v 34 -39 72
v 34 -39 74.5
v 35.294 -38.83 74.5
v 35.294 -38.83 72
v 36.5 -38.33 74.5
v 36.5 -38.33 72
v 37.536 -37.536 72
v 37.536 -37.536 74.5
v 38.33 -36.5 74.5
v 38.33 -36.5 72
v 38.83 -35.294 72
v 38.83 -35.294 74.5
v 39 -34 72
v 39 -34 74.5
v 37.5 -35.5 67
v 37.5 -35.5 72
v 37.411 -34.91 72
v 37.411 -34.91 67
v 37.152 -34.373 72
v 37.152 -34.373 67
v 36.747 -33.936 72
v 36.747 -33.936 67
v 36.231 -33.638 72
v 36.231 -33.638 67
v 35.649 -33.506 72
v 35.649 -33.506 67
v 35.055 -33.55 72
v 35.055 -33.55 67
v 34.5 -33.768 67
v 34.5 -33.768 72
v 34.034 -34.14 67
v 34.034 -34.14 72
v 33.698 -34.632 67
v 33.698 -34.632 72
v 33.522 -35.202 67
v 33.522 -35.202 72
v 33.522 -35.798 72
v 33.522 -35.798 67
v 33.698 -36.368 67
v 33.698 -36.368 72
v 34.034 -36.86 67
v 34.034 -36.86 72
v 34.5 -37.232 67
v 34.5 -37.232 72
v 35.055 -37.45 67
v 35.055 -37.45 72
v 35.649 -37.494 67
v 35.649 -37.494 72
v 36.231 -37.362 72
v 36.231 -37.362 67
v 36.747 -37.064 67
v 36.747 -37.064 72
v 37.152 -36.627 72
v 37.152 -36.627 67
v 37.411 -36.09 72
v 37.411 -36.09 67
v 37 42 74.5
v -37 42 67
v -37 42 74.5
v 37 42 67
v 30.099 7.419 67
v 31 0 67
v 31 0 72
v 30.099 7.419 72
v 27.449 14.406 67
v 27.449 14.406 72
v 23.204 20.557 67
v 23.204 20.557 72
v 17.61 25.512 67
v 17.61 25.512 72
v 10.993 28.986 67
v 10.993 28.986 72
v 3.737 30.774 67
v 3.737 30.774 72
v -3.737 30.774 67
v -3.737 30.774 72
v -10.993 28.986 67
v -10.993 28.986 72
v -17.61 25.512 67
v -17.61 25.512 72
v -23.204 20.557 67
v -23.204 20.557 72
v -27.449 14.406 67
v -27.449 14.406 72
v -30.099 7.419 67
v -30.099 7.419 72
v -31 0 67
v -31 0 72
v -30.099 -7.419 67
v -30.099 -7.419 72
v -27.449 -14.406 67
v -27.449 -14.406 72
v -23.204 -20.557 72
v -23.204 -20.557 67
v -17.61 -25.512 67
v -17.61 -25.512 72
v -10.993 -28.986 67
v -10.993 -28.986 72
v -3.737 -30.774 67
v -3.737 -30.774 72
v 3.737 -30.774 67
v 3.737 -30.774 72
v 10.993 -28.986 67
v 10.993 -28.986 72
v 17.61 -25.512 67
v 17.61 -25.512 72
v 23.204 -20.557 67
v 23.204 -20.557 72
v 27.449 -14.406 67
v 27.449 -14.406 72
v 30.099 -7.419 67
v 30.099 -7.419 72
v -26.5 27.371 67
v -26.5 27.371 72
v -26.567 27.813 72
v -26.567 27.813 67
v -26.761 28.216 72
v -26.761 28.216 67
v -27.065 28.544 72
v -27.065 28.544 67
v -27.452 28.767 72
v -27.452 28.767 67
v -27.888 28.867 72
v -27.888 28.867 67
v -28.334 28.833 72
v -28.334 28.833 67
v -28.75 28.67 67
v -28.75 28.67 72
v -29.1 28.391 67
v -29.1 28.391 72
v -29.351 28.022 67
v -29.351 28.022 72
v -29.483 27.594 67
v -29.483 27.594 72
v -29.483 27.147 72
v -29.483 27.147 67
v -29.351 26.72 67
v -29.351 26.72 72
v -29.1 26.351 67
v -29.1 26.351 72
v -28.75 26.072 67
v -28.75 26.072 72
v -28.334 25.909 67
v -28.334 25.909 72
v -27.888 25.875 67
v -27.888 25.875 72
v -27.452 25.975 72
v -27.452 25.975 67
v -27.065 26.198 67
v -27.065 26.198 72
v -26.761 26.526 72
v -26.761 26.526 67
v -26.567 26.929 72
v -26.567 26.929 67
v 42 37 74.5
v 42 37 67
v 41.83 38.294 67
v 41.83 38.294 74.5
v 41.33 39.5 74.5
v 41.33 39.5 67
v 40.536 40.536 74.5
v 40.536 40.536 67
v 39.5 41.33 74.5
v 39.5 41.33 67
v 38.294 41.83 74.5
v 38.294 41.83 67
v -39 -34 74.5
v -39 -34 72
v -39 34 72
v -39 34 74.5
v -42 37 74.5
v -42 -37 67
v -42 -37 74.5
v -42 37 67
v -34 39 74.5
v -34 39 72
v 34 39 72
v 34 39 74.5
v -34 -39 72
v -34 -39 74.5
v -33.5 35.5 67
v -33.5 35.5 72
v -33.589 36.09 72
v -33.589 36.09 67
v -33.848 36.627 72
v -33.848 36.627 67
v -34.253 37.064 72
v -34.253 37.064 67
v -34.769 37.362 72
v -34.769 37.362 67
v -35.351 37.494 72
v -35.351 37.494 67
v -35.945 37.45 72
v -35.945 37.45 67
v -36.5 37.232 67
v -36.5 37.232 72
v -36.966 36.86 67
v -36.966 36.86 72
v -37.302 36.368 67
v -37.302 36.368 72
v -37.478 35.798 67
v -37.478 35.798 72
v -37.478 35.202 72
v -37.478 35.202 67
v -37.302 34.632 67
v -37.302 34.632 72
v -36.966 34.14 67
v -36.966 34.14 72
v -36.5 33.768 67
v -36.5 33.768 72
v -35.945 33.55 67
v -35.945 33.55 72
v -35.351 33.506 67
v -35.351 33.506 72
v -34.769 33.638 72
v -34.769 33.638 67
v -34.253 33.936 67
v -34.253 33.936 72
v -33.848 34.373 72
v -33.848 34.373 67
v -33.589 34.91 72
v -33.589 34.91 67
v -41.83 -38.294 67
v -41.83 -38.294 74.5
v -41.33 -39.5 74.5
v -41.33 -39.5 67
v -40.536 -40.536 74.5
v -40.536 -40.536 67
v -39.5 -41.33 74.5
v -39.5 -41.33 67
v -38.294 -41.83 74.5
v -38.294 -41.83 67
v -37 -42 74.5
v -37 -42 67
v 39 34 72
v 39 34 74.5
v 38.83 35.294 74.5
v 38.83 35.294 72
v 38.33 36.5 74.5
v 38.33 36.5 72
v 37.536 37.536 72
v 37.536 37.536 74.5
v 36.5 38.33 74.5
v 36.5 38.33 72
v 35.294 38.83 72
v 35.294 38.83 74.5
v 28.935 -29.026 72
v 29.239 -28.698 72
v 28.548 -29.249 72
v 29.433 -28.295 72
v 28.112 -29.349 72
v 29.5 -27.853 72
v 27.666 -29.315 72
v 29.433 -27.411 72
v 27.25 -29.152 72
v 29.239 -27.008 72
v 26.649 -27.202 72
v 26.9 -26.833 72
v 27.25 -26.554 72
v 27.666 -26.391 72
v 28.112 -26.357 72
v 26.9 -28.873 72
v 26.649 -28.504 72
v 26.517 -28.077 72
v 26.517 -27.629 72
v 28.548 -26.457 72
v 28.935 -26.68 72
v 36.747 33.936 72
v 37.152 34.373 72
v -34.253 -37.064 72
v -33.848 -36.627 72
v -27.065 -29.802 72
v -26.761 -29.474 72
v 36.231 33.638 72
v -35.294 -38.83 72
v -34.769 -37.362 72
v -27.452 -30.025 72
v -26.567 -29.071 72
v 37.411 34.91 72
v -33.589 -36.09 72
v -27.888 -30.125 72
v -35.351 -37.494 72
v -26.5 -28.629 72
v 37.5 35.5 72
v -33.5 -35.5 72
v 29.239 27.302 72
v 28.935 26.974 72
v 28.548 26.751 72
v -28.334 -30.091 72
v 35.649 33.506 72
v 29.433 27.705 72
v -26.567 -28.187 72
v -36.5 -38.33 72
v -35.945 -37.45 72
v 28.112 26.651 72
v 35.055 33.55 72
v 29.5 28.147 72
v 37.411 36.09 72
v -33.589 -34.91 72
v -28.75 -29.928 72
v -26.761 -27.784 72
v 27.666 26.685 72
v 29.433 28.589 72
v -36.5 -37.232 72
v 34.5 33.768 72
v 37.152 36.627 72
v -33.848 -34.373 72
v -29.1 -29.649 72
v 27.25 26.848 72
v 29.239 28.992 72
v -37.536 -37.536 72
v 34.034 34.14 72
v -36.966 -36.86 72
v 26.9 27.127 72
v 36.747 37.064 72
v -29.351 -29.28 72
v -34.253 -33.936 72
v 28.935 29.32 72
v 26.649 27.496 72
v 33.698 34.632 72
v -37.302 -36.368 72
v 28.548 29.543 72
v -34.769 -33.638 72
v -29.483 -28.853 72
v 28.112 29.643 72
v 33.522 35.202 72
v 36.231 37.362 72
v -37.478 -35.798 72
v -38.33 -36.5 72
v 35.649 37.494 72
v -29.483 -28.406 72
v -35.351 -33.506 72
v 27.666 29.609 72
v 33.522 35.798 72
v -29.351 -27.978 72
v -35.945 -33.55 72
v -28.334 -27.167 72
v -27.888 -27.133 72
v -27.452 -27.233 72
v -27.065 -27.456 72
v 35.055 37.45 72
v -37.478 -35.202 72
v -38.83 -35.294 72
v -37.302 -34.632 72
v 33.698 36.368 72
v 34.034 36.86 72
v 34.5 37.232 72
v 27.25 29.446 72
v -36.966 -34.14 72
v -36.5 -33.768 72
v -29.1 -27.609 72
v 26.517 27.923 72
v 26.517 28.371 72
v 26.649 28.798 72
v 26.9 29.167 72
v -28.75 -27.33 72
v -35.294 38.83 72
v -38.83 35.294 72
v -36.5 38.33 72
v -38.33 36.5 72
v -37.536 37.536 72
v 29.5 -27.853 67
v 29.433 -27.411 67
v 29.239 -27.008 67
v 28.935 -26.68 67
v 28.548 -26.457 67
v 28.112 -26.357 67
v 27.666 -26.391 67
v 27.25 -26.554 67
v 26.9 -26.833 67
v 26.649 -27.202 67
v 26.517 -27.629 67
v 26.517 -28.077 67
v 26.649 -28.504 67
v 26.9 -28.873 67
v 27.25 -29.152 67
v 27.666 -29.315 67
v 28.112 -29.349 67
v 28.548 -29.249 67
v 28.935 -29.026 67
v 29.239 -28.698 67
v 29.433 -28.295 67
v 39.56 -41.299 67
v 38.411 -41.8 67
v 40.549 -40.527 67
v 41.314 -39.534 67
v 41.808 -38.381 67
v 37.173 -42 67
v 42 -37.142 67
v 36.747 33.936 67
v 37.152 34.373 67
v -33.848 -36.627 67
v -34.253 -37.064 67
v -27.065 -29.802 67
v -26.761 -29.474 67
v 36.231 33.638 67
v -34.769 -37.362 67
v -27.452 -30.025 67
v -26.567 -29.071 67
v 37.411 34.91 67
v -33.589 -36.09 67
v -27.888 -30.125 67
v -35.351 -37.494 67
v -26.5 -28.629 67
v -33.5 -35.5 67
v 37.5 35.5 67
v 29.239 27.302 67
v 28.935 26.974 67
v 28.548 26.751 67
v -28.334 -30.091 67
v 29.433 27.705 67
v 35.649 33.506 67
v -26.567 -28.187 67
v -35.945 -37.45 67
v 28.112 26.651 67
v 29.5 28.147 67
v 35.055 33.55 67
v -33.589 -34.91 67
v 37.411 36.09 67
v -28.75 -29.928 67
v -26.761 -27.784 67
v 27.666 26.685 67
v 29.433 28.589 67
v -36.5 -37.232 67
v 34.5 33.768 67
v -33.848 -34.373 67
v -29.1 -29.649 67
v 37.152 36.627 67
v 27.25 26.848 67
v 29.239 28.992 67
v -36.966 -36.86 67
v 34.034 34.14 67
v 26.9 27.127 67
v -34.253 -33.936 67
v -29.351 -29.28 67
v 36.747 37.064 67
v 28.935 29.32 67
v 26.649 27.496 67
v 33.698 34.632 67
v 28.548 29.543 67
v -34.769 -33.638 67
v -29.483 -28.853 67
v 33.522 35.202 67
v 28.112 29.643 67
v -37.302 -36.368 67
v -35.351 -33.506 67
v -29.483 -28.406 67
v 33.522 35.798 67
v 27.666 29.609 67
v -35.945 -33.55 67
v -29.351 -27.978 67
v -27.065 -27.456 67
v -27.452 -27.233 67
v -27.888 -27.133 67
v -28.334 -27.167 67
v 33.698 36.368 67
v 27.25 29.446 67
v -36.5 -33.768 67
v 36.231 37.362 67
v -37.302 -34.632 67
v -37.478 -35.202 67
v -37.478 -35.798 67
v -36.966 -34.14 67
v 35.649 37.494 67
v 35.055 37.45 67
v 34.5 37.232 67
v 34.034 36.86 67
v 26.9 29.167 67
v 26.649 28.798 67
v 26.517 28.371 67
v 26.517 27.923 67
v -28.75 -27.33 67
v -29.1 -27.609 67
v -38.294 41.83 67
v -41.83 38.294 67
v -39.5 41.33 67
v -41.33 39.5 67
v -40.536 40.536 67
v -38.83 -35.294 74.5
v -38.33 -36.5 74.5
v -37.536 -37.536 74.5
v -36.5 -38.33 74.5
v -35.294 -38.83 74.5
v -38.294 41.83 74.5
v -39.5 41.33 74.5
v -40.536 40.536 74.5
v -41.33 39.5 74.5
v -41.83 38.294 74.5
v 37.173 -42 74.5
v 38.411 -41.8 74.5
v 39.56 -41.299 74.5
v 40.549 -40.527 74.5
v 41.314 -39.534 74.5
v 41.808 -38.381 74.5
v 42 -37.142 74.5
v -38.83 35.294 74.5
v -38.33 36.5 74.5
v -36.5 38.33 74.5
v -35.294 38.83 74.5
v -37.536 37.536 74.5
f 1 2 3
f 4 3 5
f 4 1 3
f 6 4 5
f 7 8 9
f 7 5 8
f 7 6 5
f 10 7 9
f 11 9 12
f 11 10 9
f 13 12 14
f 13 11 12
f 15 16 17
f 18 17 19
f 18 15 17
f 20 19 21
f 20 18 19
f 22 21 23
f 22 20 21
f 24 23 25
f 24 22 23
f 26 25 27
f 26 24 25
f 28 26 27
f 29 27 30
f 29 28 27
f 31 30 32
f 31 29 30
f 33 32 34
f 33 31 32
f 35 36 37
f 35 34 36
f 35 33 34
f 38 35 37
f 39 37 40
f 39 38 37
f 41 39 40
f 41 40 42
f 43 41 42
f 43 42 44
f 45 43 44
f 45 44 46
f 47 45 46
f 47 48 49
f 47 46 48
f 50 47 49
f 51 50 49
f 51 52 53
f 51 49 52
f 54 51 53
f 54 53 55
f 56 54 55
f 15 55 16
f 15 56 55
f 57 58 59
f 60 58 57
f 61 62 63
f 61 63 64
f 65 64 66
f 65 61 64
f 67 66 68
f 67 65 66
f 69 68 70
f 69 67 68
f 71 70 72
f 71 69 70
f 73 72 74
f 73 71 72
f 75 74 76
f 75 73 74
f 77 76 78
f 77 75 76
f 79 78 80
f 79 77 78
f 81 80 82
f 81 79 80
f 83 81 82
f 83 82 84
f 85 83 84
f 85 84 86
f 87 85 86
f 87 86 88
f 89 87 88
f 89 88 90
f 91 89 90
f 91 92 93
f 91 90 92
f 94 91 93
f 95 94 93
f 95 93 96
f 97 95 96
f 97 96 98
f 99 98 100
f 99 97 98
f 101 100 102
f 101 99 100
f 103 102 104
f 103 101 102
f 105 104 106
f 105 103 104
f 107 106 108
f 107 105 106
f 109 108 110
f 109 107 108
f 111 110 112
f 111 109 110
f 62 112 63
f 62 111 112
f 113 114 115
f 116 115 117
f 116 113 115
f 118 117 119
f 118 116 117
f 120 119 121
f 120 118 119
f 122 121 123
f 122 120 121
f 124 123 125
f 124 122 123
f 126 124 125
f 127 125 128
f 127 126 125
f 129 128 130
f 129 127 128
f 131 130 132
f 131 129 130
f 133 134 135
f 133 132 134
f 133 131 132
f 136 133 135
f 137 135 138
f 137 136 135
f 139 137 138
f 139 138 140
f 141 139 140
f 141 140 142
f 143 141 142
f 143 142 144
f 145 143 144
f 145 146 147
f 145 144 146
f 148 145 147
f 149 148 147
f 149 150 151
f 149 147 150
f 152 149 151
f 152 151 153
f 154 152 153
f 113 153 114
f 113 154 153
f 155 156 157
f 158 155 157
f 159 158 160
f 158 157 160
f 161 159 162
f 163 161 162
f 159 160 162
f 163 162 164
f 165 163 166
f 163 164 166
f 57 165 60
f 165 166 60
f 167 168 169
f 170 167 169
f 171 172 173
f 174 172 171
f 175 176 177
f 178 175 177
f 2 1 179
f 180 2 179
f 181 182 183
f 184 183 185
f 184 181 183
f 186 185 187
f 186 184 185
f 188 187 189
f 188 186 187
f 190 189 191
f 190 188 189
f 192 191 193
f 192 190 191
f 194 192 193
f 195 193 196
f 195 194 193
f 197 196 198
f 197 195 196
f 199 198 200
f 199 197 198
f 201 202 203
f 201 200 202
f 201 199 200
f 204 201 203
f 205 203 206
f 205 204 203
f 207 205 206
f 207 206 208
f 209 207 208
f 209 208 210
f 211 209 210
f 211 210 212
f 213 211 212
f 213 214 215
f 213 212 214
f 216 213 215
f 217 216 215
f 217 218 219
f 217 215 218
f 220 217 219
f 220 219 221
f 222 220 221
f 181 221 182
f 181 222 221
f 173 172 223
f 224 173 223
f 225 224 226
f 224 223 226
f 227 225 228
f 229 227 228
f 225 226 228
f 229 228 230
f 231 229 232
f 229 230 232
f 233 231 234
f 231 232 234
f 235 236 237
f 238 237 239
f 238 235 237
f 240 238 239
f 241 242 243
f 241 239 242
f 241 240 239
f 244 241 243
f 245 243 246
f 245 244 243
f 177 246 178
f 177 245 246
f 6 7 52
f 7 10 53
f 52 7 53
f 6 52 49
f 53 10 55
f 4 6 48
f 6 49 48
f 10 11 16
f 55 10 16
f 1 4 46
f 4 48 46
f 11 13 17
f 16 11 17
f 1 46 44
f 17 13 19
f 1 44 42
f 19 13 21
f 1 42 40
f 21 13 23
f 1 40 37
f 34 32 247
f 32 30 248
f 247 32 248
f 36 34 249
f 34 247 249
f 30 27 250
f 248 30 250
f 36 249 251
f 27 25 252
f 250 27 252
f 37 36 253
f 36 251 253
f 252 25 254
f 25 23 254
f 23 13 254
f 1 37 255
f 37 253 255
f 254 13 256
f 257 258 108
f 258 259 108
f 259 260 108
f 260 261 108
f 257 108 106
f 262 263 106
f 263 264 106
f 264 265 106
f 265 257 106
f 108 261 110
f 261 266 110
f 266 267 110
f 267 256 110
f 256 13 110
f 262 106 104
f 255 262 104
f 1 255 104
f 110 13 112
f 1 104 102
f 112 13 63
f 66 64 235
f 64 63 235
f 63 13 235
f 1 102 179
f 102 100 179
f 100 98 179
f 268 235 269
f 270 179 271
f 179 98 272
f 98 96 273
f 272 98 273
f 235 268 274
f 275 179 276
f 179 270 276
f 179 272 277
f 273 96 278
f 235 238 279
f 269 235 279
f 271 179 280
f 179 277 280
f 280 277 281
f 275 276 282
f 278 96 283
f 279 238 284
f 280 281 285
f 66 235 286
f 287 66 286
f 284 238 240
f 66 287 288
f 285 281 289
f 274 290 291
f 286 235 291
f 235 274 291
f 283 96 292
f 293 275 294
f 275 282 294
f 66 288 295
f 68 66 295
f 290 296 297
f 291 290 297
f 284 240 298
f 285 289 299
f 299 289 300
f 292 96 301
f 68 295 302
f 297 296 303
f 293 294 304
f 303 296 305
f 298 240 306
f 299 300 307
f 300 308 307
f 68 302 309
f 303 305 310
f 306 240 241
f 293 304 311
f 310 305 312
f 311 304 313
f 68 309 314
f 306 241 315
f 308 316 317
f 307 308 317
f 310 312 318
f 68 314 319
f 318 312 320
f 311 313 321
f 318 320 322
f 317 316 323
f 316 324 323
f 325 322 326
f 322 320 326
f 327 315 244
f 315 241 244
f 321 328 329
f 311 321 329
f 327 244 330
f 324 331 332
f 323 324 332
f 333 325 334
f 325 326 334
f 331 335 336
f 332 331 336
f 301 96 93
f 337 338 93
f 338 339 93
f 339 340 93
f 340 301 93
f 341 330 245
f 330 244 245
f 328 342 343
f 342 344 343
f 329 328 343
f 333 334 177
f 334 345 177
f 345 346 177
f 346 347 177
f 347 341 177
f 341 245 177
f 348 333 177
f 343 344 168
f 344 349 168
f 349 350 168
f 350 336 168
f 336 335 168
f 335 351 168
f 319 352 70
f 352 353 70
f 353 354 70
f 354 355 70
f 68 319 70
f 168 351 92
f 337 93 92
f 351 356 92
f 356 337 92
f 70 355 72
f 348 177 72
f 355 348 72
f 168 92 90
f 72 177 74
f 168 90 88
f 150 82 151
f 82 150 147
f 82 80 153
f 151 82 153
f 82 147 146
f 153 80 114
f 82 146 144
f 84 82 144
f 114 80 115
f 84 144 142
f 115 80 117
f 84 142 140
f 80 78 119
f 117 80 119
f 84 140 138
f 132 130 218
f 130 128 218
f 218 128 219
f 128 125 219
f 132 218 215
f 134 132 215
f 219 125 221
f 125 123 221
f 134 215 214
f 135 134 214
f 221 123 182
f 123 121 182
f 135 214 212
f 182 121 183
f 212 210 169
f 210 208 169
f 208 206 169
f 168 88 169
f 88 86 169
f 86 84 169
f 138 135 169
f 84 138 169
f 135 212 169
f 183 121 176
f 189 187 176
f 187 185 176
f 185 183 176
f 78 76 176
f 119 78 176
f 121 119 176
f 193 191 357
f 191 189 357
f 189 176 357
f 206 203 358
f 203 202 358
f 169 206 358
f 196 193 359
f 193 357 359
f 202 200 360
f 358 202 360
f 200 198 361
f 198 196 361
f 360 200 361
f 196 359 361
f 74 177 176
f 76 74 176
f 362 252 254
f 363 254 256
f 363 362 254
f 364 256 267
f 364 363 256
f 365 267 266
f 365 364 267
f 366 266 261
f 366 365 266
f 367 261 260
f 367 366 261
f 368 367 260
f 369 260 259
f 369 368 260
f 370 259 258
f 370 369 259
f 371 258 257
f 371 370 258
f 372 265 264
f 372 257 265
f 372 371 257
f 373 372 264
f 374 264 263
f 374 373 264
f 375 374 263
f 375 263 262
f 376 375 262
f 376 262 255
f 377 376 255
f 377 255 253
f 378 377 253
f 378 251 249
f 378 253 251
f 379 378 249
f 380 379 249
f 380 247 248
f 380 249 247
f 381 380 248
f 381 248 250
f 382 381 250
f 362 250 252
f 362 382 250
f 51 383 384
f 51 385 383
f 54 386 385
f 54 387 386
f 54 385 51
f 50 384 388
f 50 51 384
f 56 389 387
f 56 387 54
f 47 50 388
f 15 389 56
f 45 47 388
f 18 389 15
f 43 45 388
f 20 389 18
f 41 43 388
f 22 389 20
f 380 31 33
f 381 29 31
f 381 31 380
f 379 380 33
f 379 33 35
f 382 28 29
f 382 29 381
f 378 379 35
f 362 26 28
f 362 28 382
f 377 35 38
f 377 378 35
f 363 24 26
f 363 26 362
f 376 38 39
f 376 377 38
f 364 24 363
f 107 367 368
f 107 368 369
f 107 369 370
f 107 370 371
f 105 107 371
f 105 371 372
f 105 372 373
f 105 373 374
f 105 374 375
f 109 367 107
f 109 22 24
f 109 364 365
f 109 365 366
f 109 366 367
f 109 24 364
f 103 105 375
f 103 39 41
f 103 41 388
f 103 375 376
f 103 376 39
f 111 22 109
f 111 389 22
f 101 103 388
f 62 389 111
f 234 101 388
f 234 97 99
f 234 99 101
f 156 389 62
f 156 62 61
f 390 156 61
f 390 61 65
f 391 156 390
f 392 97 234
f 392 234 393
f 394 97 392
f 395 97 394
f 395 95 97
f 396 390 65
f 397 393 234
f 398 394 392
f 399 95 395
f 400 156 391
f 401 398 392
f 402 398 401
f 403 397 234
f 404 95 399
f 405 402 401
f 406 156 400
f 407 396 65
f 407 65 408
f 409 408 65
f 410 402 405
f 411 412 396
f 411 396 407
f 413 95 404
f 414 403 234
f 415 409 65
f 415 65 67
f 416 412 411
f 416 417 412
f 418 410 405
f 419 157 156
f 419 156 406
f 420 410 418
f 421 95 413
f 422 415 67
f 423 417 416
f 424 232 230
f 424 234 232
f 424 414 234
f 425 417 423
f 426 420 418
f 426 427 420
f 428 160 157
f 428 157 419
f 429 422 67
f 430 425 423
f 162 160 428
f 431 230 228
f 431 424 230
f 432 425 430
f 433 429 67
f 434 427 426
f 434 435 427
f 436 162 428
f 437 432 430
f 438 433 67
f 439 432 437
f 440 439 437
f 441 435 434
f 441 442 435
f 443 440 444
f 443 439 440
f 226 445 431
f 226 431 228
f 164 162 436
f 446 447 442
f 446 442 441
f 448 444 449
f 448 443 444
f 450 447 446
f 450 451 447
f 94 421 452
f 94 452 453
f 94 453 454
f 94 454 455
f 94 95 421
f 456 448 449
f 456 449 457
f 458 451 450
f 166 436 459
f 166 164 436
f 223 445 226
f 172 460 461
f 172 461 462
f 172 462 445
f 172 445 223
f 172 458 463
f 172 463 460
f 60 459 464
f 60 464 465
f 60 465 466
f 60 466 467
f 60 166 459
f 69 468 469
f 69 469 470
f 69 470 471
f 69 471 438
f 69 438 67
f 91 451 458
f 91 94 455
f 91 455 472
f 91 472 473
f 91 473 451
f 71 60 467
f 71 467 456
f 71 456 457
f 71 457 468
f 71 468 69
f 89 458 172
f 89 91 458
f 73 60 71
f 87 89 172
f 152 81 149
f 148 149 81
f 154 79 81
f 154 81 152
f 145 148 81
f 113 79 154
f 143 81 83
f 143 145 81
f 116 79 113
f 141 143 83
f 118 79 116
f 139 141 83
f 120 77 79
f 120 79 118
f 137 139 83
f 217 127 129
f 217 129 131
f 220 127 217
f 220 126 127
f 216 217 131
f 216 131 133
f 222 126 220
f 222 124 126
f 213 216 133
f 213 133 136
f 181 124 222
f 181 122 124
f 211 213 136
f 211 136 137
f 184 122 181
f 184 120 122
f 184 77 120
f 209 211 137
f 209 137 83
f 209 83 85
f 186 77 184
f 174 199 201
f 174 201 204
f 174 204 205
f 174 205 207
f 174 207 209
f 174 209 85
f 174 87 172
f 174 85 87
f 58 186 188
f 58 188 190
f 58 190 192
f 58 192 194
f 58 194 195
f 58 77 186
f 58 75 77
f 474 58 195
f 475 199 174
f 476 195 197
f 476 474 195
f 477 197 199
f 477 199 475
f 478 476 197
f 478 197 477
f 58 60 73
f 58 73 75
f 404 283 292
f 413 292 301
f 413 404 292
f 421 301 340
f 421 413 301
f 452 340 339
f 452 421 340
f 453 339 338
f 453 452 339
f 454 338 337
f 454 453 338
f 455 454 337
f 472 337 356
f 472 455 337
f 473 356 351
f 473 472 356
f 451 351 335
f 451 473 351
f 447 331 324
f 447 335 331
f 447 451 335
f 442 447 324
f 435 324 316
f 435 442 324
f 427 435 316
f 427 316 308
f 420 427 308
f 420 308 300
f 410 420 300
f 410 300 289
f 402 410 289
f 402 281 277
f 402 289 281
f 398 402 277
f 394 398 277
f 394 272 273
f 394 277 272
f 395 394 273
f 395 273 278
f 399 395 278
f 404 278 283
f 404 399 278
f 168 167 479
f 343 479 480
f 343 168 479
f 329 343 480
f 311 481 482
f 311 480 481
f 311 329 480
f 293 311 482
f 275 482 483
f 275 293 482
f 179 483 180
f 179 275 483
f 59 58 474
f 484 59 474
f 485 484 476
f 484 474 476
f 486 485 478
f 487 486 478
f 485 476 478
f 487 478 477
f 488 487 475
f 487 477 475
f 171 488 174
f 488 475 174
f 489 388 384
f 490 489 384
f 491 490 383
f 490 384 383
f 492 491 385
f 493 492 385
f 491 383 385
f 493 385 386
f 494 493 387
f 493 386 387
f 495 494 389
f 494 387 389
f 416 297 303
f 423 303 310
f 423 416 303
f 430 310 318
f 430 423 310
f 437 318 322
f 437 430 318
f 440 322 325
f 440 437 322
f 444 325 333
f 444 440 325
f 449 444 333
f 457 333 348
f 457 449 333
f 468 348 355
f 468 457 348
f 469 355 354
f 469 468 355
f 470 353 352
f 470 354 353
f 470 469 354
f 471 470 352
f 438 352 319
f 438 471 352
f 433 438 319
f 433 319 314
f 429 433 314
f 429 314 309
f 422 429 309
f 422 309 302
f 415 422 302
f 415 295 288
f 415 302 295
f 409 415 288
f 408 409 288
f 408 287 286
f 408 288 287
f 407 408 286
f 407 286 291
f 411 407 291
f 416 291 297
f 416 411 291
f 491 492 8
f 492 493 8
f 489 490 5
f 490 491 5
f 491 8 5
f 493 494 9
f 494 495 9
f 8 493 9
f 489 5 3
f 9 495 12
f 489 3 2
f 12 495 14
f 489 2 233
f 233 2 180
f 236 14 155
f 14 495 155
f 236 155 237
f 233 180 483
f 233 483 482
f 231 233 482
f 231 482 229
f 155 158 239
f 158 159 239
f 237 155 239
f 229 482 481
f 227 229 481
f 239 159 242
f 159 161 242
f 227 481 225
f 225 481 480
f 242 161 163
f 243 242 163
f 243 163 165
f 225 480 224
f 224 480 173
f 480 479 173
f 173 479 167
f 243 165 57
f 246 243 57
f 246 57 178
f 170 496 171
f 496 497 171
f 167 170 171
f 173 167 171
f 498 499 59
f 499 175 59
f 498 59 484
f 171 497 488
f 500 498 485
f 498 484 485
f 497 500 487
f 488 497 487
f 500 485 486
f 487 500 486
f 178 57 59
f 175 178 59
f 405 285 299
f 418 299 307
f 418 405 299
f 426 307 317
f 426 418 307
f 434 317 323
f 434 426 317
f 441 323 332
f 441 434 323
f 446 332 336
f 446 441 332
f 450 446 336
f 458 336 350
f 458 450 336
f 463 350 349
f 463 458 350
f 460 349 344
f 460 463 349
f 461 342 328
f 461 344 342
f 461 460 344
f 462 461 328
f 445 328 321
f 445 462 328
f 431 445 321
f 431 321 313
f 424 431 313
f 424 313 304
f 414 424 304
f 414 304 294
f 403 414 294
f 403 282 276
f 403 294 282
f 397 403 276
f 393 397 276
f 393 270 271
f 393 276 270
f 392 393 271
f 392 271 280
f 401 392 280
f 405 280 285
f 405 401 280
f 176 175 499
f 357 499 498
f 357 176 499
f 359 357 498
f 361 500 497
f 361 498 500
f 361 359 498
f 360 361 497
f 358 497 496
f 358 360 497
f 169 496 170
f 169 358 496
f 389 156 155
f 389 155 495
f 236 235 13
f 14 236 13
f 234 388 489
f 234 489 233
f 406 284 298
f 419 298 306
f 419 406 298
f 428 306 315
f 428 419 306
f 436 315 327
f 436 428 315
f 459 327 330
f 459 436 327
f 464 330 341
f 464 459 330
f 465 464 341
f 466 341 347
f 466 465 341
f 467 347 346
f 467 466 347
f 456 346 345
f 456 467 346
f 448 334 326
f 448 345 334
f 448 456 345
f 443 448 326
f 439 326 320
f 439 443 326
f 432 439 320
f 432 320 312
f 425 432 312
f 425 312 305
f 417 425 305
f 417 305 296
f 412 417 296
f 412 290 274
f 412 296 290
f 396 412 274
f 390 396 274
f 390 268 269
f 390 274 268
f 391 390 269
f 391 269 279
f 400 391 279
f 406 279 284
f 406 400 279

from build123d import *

# Parameters (mm, degrees)
EXTRUDE002_DEPTH = 9
SKETCH009_R      = 1.5
SKETCH009_R_2    = 31
SKETCH009_R_3    = 2
EXTRUDE001_DEPTH = 7.5


with BuildPart() as extrude002:
    # Sketch010 → Extrude002 (new body)
    with BuildSketch(Plane.XY):
        with BuildLine():
            Line((-34, 39), (34, 39))
            ThreePointArc((39, 34), (37.535534, 37.535534), (34, 39))
            Line((39, 34), (39, -34))
            ThreePointArc((34, -39), (37.535534, -37.535534), (39, -34))
            Line((34, -39), (-34, -39))
            ThreePointArc((-39, -34), (-37.535534, -37.535534), (-34, -39))
            Line((-39, -34), (-39, 34))
            ThreePointArc((-34, 39), (-37.535534, 37.535534), (-39, 34))
        make_face()
    extrude(amount=EXTRUDE002_DEPTH)


with BuildPart() as extrude002_1:
    # Extrude002 placement: moved
    add(extrude002.part.moved(Location((0, 0, 5))))


with BuildPart() as frontplate:
    # Sketch009 → Extrude001 (new body)
    with BuildSketch(Plane.XY):
        with BuildLine():
            Line((-37, 42), (37, 42))
            ThreePointArc((42, 37), (40.535534, 40.535534), (37, 42))
            Line((42, 37), (42, -37.141721))
            ThreePointArc((37.172983, -42), (40.548854, -40.527031), (42, -37.141721))
            Line((37.172983, -42), (-37, -42))
            ThreePointArc((-42, -37), (-40.535534, -40.535534), (-37, -42))
            Line((-42, -37), (-42, 37))
            ThreePointArc((-37, 42), (-40.535534, 40.535534), (-42, 37))
        make_face()
        with Locations((-28, 27.370892)):
            Circle(SKETCH009_R, mode=Mode.SUBTRACT)
        with Locations((28, 28.147012)):
            Circle(SKETCH009_R, mode=Mode.SUBTRACT)
        with Locations((28, -27.852988)):
            Circle(SKETCH009_R, mode=Mode.SUBTRACT)
        with Locations((-28, -28.629108)):
            Circle(SKETCH009_R, mode=Mode.SUBTRACT)
        Circle(SKETCH009_R_2, mode=Mode.SUBTRACT)
        with Locations((35.5, -35.5)):
            Circle(SKETCH009_R_3, mode=Mode.SUBTRACT)
        with Locations((-35.5, -35.5)):
            Circle(SKETCH009_R_3, mode=Mode.SUBTRACT)
        with Locations((-35.5, 35.5)):
            Circle(SKETCH009_R_3, mode=Mode.SUBTRACT)
        with Locations((35.5, 35.5)):
            Circle(SKETCH009_R_3, mode=Mode.SUBTRACT)
    extrude(amount=EXTRUDE001_DEPTH)

    # Cut028: cut Extrude002
    add(extrude002_1.part, mode=Mode.SUBTRACT)


with BuildPart() as frontplate_1:
    # Cut028 placement: moved
    add(frontplate.part.moved(Location((0, 0, 67))))


solid = frontplate_1.part
